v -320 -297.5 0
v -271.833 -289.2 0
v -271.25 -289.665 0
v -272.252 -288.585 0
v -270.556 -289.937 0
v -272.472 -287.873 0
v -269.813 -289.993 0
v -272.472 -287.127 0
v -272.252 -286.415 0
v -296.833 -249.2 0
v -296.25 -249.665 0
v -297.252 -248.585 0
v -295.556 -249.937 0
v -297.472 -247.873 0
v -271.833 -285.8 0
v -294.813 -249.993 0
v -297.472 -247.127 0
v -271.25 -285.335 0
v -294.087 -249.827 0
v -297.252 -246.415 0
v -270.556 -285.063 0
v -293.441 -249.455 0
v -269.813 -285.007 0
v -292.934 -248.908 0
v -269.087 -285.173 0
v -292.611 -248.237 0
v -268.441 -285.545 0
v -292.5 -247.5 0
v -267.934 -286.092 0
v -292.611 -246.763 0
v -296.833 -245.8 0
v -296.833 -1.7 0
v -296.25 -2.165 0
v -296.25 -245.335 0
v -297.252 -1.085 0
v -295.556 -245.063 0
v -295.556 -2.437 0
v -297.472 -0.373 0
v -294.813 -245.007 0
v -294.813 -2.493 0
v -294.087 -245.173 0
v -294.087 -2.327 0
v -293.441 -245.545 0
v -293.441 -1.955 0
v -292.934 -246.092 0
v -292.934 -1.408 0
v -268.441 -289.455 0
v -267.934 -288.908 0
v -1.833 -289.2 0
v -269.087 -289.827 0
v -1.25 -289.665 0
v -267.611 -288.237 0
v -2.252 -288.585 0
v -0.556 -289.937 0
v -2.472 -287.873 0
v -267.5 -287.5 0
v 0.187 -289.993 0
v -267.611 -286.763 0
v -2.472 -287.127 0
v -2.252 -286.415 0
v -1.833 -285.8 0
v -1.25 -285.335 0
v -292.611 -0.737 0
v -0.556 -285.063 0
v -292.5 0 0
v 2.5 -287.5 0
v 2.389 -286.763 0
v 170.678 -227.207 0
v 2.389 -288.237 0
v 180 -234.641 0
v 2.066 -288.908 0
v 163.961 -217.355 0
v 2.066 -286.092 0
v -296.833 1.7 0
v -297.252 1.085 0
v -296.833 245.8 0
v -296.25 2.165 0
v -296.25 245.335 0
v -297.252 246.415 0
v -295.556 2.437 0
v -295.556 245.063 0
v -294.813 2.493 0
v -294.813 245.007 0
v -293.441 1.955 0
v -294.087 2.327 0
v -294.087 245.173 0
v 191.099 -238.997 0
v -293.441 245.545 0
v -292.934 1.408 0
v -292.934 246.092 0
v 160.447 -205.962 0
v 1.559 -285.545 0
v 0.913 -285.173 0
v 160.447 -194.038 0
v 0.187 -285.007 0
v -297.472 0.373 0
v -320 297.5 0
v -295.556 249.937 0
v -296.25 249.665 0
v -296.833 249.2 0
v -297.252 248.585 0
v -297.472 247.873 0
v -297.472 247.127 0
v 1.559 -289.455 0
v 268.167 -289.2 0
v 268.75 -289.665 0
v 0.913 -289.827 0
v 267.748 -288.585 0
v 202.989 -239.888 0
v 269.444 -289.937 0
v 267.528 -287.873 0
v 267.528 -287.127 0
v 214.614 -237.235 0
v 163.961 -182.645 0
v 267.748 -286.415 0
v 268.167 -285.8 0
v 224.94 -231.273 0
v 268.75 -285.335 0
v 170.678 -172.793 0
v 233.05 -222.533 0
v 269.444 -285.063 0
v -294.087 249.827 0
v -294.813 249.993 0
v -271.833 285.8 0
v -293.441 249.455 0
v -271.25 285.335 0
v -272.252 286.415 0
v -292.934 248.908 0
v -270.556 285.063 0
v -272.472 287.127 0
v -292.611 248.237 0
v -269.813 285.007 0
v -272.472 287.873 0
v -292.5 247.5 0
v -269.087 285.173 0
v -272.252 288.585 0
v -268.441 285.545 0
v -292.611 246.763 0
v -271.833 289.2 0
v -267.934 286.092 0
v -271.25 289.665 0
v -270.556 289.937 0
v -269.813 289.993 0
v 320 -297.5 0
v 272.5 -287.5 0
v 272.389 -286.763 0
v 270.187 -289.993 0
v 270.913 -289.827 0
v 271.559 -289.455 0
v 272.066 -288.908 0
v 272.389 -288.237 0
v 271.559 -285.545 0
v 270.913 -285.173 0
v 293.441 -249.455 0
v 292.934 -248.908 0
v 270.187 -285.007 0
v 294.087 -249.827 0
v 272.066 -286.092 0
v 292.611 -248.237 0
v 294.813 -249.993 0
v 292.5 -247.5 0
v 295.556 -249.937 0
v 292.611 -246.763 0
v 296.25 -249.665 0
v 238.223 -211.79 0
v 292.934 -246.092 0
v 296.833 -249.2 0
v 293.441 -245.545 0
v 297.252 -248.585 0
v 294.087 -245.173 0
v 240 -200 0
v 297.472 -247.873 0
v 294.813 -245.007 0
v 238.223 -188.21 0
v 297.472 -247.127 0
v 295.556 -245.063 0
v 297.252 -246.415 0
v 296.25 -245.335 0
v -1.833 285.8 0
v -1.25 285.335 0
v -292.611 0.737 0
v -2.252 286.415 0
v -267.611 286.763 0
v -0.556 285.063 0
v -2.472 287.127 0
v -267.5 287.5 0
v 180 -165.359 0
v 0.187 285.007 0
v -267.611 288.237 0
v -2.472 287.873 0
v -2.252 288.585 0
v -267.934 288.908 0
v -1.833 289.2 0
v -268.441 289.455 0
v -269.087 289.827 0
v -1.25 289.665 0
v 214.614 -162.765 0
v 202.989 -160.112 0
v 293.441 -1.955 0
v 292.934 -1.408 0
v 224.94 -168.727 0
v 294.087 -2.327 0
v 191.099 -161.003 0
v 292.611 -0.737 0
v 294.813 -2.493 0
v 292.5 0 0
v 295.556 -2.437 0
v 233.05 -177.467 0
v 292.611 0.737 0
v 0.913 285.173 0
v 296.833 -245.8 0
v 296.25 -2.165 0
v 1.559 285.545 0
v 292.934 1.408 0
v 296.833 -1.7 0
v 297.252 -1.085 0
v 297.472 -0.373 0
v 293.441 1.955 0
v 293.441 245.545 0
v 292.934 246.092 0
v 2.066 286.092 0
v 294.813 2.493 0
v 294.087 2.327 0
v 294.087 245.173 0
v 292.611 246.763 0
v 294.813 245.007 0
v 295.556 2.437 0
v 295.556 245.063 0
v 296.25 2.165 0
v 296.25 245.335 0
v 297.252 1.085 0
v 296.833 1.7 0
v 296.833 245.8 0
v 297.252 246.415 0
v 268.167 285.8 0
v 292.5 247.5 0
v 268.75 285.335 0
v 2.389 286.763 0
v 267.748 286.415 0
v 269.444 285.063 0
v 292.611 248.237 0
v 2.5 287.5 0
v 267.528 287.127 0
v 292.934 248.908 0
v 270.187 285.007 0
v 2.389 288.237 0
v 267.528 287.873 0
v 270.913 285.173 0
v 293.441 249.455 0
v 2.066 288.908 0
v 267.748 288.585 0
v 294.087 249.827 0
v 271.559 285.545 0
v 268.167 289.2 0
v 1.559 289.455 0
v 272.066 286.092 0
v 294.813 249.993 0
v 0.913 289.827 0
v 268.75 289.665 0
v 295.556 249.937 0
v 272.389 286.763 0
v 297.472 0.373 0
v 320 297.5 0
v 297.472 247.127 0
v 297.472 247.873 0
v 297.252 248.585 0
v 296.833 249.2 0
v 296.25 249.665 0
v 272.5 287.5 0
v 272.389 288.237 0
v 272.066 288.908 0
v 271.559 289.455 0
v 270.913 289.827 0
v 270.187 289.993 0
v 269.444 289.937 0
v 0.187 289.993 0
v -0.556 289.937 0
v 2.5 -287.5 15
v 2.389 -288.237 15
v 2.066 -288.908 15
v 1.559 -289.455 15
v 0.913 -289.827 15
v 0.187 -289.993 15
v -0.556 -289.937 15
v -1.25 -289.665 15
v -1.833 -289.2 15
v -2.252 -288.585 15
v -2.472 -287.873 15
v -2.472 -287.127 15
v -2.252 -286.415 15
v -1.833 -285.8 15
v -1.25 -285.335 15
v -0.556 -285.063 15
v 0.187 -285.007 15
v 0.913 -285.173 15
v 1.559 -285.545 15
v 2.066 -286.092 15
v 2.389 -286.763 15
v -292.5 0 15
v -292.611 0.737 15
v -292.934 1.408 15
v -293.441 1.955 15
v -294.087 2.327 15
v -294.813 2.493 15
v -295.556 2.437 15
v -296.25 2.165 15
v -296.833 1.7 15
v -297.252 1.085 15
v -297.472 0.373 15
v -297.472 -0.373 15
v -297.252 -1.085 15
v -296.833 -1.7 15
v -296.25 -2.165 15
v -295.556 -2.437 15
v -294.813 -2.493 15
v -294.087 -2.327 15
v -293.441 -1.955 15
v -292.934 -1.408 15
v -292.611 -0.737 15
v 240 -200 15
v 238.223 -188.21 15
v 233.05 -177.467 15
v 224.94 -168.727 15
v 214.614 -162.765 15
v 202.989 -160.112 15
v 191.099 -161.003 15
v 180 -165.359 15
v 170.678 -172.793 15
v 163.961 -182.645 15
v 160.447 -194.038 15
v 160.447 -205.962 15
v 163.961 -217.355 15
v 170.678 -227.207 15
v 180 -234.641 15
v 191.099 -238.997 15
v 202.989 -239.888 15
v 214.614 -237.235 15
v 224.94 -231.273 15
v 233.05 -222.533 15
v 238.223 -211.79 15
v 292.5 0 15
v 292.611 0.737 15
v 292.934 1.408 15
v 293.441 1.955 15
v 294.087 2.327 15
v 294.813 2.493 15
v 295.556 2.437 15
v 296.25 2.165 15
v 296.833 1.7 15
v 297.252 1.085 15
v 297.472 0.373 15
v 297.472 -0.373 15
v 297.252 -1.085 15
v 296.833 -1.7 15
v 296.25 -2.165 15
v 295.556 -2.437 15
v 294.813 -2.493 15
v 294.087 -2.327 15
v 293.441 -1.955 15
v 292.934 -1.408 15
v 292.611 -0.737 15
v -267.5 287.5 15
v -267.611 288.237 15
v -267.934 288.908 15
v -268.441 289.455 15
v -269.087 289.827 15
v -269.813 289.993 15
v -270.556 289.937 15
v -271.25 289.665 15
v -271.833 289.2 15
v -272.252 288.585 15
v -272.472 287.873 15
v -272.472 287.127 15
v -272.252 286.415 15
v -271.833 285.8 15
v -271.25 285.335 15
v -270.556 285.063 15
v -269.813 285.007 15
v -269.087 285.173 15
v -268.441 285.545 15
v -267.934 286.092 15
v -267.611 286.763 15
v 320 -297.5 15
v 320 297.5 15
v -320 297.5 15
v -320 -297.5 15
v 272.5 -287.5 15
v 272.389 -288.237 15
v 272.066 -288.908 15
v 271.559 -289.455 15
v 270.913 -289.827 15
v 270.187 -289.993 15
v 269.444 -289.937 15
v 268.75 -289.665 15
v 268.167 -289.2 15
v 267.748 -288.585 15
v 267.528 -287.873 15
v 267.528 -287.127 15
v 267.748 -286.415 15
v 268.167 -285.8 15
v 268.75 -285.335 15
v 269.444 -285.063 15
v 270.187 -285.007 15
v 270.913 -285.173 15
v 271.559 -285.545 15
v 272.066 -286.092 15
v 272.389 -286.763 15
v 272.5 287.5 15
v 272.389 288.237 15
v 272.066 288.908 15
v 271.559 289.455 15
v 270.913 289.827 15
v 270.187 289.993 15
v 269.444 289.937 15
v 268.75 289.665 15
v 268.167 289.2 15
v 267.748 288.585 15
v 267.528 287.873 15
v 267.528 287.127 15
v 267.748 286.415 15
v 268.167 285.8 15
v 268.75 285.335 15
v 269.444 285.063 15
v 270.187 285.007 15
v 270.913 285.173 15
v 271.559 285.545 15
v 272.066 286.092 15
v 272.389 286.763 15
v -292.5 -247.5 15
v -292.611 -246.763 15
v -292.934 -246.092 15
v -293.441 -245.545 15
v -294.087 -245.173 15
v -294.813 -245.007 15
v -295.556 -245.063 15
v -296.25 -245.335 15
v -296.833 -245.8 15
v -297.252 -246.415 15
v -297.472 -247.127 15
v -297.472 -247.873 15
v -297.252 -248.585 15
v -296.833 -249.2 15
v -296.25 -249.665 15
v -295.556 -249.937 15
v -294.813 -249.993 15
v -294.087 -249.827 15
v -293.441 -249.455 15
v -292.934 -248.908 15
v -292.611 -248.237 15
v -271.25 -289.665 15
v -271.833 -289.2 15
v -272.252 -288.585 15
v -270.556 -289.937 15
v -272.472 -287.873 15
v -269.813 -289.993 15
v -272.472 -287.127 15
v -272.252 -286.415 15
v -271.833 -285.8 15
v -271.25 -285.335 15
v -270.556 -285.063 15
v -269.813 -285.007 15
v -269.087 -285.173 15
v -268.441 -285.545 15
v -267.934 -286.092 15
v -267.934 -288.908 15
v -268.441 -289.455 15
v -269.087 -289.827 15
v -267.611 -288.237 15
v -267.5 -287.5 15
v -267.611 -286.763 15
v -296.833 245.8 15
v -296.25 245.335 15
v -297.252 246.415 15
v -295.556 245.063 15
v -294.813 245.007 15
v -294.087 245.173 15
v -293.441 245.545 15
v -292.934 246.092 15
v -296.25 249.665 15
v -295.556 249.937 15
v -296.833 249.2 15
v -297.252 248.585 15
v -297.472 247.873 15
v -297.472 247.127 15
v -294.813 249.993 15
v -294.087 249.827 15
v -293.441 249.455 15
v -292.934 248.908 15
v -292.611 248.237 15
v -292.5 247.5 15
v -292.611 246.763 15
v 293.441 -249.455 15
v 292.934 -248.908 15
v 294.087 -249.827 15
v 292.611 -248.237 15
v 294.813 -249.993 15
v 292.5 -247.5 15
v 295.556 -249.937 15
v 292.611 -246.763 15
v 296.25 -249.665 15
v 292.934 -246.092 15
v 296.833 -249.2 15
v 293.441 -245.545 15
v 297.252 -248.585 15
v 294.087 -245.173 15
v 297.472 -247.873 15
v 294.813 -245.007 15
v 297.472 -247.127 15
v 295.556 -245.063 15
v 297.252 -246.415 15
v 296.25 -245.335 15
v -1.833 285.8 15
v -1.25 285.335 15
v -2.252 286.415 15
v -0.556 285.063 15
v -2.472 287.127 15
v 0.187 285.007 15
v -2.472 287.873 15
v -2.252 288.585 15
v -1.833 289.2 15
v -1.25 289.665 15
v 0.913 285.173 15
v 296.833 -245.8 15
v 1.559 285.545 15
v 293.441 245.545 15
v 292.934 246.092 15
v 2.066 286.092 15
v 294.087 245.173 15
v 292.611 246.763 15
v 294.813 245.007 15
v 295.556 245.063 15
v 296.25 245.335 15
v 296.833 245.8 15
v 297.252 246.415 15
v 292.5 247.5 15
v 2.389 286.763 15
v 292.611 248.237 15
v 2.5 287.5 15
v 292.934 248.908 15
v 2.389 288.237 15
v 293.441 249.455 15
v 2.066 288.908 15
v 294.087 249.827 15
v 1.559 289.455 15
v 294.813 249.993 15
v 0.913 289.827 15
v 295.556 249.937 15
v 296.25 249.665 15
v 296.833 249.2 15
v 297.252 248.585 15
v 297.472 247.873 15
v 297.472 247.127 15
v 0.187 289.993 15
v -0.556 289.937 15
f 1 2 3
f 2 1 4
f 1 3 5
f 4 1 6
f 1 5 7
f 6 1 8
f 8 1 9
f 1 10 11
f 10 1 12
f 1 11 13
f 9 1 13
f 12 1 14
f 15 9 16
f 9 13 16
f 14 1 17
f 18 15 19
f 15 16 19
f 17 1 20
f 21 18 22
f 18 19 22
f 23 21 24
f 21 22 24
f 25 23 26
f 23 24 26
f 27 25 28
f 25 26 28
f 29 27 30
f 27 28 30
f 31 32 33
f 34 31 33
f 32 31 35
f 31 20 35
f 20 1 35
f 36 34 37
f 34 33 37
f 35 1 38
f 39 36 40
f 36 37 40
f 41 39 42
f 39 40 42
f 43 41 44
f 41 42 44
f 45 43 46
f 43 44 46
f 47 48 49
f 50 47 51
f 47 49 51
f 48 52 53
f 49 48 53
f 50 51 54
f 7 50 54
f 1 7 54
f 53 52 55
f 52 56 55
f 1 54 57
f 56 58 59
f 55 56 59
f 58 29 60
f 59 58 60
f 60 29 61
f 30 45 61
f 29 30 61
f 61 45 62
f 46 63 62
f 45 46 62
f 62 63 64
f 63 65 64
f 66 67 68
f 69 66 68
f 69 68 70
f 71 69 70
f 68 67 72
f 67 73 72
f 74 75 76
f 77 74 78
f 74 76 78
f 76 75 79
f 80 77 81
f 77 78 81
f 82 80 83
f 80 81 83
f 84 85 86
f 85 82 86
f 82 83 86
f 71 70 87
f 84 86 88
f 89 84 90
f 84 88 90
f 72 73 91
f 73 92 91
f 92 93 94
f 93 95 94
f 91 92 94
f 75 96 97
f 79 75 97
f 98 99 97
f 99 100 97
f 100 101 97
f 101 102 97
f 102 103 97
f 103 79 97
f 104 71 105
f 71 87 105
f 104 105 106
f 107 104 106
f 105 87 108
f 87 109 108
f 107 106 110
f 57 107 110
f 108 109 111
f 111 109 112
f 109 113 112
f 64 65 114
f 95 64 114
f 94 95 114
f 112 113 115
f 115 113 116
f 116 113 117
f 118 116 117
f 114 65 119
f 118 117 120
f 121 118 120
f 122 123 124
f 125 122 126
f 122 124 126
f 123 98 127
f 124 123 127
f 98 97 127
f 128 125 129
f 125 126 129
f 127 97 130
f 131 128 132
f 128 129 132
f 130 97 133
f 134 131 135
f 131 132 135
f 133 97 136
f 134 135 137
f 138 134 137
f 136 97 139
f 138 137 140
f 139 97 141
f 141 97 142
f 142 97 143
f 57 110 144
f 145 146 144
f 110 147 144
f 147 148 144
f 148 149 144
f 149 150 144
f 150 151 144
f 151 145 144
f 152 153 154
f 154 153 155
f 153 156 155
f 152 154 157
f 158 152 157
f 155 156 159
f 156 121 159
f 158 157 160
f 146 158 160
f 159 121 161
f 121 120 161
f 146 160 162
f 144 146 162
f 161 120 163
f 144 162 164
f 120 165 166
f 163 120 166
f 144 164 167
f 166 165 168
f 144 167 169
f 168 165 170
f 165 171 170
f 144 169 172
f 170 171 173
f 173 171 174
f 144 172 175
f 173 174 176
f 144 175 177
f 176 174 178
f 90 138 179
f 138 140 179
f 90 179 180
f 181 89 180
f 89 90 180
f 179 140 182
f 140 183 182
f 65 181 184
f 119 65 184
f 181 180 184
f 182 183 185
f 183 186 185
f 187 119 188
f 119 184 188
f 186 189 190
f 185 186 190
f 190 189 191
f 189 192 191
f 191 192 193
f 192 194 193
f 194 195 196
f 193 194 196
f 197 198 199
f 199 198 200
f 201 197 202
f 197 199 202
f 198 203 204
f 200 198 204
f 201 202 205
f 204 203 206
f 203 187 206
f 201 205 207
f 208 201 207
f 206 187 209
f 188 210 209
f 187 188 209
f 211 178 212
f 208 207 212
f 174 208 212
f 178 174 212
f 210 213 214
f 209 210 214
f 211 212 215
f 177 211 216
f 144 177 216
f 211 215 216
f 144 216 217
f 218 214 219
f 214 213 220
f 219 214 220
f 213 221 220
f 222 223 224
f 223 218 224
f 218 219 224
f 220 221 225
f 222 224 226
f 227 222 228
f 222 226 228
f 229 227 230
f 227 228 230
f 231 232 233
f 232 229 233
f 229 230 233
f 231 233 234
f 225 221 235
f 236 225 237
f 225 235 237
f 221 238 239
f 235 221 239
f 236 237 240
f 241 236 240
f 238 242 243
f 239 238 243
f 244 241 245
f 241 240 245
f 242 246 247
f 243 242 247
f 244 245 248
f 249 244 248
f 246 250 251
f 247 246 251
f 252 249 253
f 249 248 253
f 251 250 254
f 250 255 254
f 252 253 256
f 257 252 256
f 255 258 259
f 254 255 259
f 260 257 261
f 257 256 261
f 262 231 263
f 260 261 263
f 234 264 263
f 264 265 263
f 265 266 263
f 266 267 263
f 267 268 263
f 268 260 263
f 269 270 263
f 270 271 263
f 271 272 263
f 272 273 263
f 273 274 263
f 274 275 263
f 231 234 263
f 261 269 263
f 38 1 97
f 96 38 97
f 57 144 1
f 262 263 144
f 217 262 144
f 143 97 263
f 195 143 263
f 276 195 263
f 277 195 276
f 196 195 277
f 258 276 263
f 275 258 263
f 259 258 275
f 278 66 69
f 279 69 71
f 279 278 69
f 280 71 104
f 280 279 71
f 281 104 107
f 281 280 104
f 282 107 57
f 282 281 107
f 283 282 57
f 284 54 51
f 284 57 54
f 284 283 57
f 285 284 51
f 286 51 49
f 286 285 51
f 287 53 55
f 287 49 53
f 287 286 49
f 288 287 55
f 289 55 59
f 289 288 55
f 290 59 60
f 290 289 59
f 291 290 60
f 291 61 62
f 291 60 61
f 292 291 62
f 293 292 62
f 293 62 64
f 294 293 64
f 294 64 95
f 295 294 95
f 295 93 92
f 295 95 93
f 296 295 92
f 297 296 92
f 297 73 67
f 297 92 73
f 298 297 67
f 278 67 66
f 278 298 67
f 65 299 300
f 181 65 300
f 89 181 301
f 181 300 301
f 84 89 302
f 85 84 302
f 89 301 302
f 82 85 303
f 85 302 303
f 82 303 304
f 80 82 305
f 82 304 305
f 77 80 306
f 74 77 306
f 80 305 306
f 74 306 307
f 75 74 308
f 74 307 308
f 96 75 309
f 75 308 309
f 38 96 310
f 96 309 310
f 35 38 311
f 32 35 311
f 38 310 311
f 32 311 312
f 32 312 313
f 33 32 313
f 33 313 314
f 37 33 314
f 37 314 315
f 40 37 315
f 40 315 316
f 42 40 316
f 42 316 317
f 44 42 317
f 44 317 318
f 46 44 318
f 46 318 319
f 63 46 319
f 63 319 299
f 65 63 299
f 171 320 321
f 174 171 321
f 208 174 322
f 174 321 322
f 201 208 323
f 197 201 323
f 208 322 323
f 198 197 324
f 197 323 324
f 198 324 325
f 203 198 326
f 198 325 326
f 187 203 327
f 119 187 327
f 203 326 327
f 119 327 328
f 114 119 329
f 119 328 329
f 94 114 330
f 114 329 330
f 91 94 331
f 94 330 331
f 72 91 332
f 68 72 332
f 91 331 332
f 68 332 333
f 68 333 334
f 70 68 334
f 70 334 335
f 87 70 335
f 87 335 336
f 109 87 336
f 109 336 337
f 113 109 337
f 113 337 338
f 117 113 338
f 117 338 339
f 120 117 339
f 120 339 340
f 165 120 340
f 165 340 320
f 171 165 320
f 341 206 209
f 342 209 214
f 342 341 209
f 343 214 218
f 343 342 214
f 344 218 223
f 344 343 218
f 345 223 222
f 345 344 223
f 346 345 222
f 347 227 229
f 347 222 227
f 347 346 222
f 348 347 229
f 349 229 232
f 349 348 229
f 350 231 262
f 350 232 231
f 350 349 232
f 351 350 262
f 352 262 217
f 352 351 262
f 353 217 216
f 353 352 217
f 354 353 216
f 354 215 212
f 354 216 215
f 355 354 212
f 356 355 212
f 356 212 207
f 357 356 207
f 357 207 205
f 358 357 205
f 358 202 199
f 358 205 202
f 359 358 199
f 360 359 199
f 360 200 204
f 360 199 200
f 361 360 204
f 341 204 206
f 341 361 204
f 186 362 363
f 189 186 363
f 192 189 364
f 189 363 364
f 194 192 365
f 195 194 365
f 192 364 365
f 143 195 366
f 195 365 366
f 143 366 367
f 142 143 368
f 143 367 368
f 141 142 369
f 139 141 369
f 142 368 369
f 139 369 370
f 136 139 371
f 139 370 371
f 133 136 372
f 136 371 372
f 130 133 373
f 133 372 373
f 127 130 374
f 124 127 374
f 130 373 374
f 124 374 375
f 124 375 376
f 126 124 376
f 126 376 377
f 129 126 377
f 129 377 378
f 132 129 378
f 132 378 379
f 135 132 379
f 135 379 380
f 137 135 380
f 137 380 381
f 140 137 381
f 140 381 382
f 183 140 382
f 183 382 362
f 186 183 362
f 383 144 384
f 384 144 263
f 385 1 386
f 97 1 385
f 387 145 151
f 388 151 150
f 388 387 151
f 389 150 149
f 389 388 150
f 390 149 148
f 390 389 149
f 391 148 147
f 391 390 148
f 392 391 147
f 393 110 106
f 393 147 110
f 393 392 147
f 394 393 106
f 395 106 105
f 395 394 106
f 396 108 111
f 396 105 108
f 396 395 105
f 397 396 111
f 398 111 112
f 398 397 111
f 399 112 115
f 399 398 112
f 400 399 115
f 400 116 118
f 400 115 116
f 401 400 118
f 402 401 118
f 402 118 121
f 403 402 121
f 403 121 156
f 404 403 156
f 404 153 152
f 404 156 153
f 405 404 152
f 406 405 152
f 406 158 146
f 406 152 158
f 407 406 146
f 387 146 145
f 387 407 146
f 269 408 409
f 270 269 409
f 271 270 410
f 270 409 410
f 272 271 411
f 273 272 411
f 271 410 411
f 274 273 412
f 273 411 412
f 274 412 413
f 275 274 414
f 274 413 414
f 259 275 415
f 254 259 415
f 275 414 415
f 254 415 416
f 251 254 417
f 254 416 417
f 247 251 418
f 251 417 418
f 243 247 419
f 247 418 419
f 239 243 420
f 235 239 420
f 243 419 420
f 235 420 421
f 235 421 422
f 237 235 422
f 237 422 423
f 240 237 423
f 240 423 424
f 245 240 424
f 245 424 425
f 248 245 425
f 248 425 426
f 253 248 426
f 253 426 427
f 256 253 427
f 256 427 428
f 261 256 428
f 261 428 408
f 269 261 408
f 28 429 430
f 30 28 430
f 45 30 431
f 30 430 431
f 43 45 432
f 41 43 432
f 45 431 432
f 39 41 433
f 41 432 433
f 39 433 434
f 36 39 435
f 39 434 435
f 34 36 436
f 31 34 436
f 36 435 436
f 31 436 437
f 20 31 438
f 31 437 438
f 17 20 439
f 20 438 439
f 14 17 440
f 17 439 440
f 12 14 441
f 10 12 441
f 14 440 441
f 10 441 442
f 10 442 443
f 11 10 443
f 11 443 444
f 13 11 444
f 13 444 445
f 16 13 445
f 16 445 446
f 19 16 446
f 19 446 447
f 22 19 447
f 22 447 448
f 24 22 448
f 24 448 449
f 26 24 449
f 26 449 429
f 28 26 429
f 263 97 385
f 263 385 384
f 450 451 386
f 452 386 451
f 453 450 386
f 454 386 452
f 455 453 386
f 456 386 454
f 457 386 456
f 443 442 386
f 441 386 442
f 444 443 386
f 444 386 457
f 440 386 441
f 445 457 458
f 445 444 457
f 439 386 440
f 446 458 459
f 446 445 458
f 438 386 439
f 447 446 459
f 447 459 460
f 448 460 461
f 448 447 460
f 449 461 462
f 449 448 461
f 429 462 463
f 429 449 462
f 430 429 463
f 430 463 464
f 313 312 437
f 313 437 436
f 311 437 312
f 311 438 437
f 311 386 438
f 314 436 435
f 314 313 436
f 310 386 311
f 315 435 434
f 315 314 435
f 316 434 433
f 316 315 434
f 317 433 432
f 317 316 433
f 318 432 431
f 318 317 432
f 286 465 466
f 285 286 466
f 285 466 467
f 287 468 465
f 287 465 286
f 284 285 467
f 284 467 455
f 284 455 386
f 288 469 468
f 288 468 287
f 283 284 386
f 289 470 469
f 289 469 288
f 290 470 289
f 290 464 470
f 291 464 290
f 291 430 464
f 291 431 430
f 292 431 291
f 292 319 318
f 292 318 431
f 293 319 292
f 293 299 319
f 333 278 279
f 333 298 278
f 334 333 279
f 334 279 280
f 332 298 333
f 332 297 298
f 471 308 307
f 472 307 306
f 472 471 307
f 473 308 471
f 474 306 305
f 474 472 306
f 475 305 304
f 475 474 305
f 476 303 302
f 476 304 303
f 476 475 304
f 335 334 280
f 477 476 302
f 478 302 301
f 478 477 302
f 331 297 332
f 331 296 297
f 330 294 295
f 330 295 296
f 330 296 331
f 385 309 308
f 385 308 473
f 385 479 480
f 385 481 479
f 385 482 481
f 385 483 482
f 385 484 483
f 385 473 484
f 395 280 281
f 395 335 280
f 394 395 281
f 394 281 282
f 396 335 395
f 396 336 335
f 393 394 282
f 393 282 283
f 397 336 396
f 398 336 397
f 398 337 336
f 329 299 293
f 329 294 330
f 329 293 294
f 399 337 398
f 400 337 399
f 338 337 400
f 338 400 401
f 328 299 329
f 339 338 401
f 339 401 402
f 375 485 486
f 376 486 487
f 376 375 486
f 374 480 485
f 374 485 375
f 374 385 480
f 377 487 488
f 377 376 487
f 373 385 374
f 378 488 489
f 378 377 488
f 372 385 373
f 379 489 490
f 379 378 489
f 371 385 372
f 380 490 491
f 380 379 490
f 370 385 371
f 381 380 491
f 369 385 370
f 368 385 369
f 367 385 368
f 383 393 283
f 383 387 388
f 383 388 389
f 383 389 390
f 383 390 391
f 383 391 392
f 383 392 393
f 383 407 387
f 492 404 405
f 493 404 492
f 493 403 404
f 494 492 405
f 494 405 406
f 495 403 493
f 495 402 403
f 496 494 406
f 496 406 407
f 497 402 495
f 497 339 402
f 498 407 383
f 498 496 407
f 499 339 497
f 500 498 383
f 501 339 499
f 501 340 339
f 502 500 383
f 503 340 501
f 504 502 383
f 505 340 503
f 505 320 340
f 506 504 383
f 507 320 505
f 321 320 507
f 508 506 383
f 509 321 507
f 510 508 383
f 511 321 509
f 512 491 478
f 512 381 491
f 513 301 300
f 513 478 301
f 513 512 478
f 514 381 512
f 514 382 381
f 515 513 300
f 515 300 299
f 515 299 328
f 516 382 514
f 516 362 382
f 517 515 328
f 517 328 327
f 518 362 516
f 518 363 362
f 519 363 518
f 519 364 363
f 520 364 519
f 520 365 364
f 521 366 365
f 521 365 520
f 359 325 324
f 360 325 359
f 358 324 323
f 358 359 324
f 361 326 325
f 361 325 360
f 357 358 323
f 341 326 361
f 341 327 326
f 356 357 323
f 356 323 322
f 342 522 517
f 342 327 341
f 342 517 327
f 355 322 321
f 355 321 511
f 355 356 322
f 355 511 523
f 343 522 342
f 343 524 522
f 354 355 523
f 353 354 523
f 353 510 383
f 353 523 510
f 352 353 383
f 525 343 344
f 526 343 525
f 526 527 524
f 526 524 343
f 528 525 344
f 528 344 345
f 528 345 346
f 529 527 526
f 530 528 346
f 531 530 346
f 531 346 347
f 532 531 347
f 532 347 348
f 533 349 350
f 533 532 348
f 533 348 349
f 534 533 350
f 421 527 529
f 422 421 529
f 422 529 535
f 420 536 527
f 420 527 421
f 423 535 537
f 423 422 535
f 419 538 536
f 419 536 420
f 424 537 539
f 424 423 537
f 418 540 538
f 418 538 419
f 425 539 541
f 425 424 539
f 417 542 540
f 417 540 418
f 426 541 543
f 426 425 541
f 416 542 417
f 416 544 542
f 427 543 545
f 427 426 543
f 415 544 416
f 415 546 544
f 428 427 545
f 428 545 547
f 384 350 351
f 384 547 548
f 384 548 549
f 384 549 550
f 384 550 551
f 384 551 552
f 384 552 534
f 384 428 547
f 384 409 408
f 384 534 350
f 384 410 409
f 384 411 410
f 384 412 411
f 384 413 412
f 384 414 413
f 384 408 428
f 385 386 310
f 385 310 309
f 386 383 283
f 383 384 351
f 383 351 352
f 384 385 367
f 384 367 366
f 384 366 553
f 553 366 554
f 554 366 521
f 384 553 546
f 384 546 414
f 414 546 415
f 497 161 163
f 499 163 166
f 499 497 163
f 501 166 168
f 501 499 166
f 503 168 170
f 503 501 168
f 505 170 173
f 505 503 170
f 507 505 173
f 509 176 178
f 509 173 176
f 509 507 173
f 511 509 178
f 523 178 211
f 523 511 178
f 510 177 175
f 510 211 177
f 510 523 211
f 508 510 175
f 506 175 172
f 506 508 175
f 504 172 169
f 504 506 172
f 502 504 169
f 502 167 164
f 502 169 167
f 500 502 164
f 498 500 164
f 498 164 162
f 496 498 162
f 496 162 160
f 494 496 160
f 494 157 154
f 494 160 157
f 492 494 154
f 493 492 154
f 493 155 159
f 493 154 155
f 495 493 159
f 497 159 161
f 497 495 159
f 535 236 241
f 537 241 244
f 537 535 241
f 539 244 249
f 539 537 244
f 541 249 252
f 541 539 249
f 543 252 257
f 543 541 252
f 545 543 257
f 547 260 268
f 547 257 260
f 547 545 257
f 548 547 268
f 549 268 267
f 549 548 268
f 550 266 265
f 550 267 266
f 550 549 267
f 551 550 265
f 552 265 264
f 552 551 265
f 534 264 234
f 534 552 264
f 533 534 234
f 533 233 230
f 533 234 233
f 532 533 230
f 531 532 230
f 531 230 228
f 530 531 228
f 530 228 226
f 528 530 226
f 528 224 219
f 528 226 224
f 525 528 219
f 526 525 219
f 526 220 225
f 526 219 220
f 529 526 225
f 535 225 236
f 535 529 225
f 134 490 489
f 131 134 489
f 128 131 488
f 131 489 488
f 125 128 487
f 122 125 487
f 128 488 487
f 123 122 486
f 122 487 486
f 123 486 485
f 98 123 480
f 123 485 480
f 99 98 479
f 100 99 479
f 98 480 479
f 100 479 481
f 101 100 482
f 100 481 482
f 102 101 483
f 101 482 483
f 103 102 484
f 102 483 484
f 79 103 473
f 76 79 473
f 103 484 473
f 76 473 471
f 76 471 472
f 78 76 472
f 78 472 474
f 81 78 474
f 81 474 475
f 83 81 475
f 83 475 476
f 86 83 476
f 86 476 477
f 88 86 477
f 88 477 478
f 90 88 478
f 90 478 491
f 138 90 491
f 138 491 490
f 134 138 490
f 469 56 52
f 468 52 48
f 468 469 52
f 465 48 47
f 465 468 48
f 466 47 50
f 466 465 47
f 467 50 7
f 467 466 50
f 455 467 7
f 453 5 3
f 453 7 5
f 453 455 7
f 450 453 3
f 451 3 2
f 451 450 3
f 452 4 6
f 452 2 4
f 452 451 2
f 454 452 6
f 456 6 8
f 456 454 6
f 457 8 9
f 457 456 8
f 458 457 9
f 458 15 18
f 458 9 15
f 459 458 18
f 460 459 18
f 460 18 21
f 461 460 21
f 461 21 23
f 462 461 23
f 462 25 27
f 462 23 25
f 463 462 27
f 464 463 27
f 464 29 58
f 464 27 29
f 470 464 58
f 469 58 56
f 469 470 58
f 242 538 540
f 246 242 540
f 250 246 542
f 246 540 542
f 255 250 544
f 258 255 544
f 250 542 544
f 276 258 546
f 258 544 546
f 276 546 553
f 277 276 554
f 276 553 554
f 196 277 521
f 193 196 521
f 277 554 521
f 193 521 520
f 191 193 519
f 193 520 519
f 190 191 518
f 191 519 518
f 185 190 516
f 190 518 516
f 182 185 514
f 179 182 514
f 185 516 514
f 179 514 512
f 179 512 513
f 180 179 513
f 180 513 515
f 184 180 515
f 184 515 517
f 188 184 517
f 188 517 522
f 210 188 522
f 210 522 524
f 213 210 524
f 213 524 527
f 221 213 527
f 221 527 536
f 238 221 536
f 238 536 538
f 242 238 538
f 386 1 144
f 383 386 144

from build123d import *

# Parameters (mm, degrees)
SKETCH_1_W          = 640
SKETCH_1_H          = 595
EXTRUDE_1_DEPTH     = 15
SKETCH_2_R          = 2.5
CUT_EXTRUDE_1_DEPTH = 438.185601318
SKETCH_2_3_R        = 2.5
CUT_EXTRUDE_2_DEPTH = 438.185601318
SKETCH_3_R          = 40
CUT_EXTRUDE_3_DEPTH = 438.185601318


with BuildPart() as part:
    # ｽｹｯﾁ1 → ﾎﾞｽ - 押し出し1 (new body)
    with BuildSketch(Plane.XY):
        Rectangle(SKETCH_1_W, SKETCH_1_H)
    extrude(amount=EXTRUDE_1_DEPTH)

    # ｽｹｯﾁ2 → ｶｯﾄ - 押し出し1 (cut, through all)
    with BuildSketch(Plane.XY.offset(15)):
        with Locations((-270, 287.5)):
            Circle(SKETCH_2_R)
        with Locations((0, 287.5)):
            Circle(SKETCH_2_R)
        with Locations((270, 287.5)):
            Circle(SKETCH_2_R)
    cut_extrude_1 = extrude(amount=-CUT_EXTRUDE_1_DEPTH, mode=Mode.SUBTRACT)

    # ｽｹｯﾁ2<3> → ｶｯﾄ - 押し出し2 (cut, through all)
    with BuildSketch(Plane.XY.offset(15)):
        with Locations((-295, 247.5)):
            Circle(SKETCH_2_3_R)
        with Locations((-295, 0)):
            Circle(SKETCH_2_3_R)
        with Locations((-295, -247.5)):
            Circle(SKETCH_2_3_R)
    cut_extrude_2 = extrude(amount=-CUT_EXTRUDE_2_DEPTH, mode=Mode.SUBTRACT)

    # ﾐﾗｰ1: ｶｯﾄ - 押し出し1 across plane
    add(cut_extrude_1.mirror(Plane.ZX), mode=Mode.SUBTRACT)

    # ﾐﾗｰ2: ｶｯﾄ - 押し出し2 across plane
    add(cut_extrude_2.mirror(Plane(origin=(0, 0, 0), x_dir=(0, 0, 1), z_dir=(1, 0, 0))), mode=Mode.SUBTRACT)

    # ｽｹｯﾁ3 → ｶｯﾄ - 押し出し3 (cut, through all)
    with BuildSketch(Plane.XY.offset(15)):
        with Locations((200, -200)):
            Circle(SKETCH_3_R)
    extrude(amount=-CUT_EXTRUDE_3_DEPTH, mode=Mode.SUBTRACT)


solid = part.part
